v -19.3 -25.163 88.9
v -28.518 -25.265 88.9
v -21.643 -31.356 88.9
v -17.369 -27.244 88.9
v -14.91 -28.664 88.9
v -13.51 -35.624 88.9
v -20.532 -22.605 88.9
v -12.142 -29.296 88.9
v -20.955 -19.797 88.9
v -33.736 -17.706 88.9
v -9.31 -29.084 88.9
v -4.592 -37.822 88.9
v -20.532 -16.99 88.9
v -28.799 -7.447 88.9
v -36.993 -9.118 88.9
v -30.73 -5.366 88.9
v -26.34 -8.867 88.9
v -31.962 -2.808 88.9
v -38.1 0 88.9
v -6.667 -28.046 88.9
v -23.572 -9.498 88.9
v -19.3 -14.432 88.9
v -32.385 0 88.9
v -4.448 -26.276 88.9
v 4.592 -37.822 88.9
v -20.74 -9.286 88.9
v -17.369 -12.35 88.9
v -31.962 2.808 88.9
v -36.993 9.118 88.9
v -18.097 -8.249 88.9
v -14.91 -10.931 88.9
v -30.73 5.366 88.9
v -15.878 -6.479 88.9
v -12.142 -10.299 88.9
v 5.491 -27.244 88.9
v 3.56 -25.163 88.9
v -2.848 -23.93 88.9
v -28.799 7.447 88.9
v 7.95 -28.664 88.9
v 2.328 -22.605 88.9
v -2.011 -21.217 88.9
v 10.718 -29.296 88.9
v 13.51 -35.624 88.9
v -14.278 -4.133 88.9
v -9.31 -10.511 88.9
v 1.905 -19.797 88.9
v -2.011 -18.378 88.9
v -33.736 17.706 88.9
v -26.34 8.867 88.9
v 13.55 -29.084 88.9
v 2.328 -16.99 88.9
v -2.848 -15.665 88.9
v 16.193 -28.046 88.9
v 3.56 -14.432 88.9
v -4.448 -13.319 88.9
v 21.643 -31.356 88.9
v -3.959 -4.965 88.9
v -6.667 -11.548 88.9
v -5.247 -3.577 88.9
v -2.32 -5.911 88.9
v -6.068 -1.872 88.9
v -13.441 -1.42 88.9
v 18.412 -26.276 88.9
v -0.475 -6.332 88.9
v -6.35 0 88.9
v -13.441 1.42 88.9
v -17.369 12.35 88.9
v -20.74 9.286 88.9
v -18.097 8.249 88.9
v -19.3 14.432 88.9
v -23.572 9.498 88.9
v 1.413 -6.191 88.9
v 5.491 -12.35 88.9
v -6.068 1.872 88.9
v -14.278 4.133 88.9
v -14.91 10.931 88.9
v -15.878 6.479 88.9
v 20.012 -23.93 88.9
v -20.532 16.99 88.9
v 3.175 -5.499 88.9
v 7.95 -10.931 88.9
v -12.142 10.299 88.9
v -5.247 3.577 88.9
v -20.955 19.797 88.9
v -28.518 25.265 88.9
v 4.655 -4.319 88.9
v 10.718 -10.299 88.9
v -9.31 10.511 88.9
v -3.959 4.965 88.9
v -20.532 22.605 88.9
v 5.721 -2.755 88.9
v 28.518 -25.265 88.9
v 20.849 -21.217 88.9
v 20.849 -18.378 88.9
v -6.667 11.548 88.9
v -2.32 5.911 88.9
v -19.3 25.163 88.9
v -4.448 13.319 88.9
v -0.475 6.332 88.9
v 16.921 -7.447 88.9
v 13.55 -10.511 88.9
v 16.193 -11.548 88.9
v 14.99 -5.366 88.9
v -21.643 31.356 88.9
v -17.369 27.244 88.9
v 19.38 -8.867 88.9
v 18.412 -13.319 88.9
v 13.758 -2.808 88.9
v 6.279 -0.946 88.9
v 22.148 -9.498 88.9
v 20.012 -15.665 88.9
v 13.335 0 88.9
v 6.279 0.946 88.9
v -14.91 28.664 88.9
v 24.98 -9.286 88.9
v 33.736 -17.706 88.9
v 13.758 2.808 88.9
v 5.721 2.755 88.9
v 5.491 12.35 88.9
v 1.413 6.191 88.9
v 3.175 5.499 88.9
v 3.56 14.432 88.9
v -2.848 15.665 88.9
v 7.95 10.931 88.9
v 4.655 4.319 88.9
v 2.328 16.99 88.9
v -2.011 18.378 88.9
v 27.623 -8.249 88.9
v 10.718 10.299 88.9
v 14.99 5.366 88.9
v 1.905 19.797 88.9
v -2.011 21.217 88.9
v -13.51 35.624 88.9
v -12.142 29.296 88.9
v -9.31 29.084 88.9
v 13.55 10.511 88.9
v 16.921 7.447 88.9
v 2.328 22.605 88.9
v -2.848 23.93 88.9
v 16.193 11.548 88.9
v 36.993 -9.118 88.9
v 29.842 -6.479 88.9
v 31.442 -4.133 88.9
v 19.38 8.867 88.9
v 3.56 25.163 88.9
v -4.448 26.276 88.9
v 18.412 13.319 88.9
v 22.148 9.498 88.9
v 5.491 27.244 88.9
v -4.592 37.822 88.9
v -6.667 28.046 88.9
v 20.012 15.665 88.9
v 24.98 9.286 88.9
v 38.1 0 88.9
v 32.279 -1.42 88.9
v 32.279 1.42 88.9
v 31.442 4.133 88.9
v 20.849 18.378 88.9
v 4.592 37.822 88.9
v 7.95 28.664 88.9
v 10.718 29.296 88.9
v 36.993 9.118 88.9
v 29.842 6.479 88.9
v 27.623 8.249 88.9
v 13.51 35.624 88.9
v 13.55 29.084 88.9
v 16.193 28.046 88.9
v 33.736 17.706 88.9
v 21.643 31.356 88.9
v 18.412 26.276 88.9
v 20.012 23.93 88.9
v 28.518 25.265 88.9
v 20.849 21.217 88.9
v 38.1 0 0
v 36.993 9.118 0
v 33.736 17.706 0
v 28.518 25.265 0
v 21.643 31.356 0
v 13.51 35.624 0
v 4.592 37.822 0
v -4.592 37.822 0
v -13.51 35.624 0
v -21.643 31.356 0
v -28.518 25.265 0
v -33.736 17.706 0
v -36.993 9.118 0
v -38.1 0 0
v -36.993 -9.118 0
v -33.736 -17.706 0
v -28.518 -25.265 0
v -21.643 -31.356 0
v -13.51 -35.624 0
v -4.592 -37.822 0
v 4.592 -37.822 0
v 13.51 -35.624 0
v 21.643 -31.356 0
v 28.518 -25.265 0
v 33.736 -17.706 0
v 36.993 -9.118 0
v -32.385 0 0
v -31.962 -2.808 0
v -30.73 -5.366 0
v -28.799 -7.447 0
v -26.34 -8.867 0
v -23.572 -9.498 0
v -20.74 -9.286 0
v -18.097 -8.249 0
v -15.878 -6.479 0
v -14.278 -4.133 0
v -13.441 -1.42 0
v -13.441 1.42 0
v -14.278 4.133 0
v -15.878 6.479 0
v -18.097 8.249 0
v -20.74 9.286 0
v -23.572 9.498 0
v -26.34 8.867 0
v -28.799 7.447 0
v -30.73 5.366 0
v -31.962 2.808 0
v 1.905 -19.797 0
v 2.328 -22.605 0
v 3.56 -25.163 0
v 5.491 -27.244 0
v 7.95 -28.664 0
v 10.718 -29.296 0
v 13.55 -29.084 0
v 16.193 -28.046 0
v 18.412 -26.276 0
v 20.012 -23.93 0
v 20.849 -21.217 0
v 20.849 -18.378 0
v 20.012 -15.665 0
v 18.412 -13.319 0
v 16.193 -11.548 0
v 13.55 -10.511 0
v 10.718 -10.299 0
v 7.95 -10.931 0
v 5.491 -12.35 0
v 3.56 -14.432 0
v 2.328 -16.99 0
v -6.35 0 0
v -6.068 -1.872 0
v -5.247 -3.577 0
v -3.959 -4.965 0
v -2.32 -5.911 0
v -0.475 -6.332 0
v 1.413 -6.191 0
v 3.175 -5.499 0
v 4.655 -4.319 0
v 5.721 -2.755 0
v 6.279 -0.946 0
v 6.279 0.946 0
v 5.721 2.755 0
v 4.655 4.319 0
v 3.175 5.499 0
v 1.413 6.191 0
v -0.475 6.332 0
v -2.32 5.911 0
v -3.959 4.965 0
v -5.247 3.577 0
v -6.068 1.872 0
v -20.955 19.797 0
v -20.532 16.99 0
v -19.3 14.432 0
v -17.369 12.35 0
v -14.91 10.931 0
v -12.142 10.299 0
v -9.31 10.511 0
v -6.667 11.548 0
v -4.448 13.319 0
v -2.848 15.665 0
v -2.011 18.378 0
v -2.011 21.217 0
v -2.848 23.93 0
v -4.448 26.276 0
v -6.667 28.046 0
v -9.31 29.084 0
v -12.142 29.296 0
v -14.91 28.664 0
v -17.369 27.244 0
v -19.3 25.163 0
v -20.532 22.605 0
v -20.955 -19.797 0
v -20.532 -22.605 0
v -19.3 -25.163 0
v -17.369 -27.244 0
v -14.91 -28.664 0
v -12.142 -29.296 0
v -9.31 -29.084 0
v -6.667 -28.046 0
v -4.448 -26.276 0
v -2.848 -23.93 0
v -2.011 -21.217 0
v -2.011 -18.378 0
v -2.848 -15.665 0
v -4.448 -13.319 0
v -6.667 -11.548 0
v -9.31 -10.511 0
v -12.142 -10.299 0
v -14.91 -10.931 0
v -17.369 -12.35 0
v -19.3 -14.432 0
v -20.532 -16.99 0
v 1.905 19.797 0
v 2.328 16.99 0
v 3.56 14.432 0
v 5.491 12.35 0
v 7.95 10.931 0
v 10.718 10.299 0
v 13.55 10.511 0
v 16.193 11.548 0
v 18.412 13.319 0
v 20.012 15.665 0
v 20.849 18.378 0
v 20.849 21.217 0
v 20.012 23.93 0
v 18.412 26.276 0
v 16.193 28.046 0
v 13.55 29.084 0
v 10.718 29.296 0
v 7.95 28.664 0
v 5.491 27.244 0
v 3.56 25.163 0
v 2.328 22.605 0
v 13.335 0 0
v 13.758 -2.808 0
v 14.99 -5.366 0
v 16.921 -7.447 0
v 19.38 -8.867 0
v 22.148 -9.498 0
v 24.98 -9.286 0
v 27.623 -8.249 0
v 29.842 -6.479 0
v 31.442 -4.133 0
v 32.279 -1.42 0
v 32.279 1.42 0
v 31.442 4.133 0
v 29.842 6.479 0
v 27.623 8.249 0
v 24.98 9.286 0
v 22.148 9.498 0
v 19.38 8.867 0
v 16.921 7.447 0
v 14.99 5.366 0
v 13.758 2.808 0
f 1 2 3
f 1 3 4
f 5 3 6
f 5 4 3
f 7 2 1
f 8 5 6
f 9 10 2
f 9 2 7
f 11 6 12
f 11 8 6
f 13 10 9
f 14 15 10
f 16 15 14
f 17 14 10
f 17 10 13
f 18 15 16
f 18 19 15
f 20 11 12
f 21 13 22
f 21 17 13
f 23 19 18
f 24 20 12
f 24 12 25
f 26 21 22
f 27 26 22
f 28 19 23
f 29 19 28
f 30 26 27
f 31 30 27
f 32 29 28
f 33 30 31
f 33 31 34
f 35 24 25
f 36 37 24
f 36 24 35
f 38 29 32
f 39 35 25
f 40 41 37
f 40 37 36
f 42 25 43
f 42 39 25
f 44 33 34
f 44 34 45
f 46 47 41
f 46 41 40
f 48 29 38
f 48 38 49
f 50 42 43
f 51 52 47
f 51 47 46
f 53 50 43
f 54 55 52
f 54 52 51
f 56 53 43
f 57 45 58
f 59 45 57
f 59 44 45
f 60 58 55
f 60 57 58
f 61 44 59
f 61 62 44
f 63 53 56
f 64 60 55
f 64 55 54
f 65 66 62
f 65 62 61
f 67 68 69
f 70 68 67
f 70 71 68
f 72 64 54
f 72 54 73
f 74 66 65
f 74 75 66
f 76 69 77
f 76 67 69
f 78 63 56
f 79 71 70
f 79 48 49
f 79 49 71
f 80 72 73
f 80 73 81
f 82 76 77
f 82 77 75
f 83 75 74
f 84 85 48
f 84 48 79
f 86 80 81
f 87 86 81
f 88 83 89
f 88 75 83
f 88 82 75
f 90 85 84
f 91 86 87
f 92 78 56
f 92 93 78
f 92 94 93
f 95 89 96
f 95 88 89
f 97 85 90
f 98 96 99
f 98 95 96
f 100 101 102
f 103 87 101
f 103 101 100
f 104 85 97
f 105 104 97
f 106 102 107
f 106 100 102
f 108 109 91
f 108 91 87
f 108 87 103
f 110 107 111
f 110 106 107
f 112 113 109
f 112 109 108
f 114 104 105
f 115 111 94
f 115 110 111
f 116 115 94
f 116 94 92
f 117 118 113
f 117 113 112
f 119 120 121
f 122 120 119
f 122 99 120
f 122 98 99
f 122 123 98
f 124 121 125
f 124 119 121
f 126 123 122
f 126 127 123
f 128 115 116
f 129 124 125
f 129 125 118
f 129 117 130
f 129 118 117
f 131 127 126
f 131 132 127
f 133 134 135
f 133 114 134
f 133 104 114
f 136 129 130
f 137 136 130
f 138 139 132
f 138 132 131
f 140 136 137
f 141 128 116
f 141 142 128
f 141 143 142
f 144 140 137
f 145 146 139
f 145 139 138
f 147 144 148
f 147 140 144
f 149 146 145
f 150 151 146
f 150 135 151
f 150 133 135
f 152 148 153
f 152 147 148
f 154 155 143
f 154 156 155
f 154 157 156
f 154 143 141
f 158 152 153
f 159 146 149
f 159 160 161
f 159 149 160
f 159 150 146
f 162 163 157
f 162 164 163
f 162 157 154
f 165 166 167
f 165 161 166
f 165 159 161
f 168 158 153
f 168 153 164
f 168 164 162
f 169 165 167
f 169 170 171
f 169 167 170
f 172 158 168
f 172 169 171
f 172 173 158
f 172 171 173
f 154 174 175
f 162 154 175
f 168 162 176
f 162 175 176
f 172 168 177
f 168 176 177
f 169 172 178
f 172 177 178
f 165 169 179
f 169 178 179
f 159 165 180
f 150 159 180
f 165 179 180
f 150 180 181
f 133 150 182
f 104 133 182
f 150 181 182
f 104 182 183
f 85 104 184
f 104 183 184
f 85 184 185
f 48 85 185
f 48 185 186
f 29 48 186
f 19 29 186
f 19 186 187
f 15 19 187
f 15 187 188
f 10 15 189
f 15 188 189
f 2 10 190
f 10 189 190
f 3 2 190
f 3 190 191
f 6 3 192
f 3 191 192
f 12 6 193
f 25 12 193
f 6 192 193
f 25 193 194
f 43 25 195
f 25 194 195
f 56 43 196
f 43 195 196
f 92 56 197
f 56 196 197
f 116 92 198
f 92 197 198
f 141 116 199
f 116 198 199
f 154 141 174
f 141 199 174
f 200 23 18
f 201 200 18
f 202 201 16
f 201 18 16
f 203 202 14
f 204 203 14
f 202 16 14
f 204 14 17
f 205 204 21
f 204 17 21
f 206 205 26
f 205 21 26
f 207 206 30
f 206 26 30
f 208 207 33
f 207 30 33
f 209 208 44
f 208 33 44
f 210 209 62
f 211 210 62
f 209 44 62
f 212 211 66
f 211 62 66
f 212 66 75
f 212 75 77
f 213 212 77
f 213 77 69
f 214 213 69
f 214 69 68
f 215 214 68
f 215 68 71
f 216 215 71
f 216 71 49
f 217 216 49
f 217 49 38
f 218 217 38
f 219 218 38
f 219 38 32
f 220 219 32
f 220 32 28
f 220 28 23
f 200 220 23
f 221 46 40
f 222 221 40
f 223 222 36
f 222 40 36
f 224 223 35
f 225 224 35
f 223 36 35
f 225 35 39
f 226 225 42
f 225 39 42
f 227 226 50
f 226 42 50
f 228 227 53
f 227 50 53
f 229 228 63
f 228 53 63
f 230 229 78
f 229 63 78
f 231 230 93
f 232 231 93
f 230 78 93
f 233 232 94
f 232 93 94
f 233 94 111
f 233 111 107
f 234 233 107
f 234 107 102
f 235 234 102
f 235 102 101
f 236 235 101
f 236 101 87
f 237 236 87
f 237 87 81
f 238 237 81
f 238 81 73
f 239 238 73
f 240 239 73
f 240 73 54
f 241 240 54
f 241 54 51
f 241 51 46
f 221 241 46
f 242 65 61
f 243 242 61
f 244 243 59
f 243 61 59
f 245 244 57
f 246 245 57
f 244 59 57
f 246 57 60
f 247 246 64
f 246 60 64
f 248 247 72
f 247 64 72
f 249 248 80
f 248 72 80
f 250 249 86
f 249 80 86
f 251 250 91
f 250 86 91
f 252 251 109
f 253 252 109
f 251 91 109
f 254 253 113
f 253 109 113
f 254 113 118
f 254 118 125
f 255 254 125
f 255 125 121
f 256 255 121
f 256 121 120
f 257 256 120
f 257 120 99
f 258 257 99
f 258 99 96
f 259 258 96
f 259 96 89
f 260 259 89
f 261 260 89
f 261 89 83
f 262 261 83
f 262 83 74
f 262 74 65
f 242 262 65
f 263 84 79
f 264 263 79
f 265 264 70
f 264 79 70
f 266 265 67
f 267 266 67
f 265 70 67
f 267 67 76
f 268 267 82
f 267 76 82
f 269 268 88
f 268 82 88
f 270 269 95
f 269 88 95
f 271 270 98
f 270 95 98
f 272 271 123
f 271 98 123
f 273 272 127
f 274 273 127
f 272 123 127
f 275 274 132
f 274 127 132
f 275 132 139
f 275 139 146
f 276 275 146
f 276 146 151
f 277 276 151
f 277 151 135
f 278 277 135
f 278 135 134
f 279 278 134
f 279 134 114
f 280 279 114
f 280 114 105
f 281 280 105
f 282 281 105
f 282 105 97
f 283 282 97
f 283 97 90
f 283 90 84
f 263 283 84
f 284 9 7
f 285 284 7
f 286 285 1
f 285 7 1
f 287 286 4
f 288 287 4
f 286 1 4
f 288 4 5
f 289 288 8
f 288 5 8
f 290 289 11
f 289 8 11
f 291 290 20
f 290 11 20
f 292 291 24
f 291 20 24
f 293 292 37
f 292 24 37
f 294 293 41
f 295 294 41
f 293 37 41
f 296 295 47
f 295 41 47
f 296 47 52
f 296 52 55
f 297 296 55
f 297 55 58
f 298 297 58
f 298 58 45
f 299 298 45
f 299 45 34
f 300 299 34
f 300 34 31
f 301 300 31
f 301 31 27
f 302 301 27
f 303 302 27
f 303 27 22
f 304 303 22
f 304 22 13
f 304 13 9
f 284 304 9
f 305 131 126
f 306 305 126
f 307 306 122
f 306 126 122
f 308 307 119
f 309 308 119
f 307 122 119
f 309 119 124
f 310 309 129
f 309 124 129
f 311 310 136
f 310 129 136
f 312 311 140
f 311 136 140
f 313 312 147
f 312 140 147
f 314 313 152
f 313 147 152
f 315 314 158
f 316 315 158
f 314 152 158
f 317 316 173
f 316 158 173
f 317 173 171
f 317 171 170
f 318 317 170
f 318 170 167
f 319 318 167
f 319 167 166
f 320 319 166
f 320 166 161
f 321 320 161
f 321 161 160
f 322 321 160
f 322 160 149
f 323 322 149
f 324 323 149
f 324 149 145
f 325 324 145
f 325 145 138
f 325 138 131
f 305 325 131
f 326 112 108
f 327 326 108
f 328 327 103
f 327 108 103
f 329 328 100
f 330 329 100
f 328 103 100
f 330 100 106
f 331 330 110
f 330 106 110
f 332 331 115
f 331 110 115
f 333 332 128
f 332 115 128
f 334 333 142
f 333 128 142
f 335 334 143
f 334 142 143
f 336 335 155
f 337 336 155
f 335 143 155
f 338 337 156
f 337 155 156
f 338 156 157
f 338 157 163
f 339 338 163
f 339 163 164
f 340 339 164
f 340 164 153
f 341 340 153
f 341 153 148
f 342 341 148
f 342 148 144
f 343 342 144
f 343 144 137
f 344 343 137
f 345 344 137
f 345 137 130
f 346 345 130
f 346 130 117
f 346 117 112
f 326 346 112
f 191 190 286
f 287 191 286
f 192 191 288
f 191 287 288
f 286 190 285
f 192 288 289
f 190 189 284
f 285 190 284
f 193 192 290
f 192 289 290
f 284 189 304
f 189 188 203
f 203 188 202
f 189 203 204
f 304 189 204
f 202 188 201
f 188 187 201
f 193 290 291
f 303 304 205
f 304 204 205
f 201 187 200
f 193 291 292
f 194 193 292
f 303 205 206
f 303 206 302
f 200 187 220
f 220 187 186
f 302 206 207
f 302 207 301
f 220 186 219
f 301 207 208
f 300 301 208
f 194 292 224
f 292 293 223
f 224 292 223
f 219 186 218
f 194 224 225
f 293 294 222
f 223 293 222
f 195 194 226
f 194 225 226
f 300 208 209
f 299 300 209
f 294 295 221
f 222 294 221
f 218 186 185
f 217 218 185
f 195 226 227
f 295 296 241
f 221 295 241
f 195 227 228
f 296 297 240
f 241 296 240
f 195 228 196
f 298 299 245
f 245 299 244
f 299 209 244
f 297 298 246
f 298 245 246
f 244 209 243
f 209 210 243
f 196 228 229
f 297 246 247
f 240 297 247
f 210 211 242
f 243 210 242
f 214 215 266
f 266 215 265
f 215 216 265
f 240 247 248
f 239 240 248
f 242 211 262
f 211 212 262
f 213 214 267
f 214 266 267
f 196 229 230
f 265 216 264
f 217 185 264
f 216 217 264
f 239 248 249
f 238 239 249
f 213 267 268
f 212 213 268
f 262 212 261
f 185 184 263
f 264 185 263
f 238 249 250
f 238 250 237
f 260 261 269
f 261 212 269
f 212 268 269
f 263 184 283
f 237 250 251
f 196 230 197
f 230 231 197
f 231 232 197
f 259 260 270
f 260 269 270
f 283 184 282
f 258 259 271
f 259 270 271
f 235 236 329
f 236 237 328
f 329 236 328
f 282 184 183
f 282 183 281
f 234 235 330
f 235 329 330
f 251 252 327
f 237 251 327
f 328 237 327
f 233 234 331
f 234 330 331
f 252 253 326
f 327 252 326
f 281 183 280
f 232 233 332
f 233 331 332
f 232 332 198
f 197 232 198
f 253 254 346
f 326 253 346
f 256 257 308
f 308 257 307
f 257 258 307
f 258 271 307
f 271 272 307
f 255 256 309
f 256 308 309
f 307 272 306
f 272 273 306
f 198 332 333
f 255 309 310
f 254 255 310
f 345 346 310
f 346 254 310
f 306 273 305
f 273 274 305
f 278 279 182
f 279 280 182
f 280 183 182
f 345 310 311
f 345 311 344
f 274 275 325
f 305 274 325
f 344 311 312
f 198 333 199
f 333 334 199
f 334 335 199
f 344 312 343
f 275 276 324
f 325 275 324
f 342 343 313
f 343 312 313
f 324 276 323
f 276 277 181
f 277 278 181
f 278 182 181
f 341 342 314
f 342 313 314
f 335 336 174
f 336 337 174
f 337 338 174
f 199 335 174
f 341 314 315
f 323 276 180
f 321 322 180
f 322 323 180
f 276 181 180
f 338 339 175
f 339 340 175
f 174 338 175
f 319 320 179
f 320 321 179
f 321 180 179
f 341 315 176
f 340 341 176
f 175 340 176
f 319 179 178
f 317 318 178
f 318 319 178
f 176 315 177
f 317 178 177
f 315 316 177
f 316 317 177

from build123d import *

# Parameters (mm, degrees)
F0_R     = 38.1
F1_DEPTH = 88.9
F3_D     = 12.7
F5_D     = 19.05


with BuildPart() as f1:
    # F0 (on Top) → F1 (new body)
    with BuildSketch(Plane.XY):
        Circle(F0_R)
    extrude(amount=F1_DEPTH)

    # F3 (through all)
    with Locations(Plane(origin=(0, 0, 0), x_dir=(1, 0, 0), z_dir=(0, 0, -1))):
        with Locations((0, 0)):
            Hole(F3_D / 2)

    # F5 (through all)
    with Locations(Plane(origin=(0, 0, 0), x_dir=(1, 0, 0), z_dir=(0, 0, -1))):
        with Locations((-22.86, 0), (-11.43, -19.797341), (11.43, -19.797341), (22.86, 0), (11.43, 19.797341), (-11.43, 19.797341)):
            Hole(F5_D / 2)


solid = f1.part
